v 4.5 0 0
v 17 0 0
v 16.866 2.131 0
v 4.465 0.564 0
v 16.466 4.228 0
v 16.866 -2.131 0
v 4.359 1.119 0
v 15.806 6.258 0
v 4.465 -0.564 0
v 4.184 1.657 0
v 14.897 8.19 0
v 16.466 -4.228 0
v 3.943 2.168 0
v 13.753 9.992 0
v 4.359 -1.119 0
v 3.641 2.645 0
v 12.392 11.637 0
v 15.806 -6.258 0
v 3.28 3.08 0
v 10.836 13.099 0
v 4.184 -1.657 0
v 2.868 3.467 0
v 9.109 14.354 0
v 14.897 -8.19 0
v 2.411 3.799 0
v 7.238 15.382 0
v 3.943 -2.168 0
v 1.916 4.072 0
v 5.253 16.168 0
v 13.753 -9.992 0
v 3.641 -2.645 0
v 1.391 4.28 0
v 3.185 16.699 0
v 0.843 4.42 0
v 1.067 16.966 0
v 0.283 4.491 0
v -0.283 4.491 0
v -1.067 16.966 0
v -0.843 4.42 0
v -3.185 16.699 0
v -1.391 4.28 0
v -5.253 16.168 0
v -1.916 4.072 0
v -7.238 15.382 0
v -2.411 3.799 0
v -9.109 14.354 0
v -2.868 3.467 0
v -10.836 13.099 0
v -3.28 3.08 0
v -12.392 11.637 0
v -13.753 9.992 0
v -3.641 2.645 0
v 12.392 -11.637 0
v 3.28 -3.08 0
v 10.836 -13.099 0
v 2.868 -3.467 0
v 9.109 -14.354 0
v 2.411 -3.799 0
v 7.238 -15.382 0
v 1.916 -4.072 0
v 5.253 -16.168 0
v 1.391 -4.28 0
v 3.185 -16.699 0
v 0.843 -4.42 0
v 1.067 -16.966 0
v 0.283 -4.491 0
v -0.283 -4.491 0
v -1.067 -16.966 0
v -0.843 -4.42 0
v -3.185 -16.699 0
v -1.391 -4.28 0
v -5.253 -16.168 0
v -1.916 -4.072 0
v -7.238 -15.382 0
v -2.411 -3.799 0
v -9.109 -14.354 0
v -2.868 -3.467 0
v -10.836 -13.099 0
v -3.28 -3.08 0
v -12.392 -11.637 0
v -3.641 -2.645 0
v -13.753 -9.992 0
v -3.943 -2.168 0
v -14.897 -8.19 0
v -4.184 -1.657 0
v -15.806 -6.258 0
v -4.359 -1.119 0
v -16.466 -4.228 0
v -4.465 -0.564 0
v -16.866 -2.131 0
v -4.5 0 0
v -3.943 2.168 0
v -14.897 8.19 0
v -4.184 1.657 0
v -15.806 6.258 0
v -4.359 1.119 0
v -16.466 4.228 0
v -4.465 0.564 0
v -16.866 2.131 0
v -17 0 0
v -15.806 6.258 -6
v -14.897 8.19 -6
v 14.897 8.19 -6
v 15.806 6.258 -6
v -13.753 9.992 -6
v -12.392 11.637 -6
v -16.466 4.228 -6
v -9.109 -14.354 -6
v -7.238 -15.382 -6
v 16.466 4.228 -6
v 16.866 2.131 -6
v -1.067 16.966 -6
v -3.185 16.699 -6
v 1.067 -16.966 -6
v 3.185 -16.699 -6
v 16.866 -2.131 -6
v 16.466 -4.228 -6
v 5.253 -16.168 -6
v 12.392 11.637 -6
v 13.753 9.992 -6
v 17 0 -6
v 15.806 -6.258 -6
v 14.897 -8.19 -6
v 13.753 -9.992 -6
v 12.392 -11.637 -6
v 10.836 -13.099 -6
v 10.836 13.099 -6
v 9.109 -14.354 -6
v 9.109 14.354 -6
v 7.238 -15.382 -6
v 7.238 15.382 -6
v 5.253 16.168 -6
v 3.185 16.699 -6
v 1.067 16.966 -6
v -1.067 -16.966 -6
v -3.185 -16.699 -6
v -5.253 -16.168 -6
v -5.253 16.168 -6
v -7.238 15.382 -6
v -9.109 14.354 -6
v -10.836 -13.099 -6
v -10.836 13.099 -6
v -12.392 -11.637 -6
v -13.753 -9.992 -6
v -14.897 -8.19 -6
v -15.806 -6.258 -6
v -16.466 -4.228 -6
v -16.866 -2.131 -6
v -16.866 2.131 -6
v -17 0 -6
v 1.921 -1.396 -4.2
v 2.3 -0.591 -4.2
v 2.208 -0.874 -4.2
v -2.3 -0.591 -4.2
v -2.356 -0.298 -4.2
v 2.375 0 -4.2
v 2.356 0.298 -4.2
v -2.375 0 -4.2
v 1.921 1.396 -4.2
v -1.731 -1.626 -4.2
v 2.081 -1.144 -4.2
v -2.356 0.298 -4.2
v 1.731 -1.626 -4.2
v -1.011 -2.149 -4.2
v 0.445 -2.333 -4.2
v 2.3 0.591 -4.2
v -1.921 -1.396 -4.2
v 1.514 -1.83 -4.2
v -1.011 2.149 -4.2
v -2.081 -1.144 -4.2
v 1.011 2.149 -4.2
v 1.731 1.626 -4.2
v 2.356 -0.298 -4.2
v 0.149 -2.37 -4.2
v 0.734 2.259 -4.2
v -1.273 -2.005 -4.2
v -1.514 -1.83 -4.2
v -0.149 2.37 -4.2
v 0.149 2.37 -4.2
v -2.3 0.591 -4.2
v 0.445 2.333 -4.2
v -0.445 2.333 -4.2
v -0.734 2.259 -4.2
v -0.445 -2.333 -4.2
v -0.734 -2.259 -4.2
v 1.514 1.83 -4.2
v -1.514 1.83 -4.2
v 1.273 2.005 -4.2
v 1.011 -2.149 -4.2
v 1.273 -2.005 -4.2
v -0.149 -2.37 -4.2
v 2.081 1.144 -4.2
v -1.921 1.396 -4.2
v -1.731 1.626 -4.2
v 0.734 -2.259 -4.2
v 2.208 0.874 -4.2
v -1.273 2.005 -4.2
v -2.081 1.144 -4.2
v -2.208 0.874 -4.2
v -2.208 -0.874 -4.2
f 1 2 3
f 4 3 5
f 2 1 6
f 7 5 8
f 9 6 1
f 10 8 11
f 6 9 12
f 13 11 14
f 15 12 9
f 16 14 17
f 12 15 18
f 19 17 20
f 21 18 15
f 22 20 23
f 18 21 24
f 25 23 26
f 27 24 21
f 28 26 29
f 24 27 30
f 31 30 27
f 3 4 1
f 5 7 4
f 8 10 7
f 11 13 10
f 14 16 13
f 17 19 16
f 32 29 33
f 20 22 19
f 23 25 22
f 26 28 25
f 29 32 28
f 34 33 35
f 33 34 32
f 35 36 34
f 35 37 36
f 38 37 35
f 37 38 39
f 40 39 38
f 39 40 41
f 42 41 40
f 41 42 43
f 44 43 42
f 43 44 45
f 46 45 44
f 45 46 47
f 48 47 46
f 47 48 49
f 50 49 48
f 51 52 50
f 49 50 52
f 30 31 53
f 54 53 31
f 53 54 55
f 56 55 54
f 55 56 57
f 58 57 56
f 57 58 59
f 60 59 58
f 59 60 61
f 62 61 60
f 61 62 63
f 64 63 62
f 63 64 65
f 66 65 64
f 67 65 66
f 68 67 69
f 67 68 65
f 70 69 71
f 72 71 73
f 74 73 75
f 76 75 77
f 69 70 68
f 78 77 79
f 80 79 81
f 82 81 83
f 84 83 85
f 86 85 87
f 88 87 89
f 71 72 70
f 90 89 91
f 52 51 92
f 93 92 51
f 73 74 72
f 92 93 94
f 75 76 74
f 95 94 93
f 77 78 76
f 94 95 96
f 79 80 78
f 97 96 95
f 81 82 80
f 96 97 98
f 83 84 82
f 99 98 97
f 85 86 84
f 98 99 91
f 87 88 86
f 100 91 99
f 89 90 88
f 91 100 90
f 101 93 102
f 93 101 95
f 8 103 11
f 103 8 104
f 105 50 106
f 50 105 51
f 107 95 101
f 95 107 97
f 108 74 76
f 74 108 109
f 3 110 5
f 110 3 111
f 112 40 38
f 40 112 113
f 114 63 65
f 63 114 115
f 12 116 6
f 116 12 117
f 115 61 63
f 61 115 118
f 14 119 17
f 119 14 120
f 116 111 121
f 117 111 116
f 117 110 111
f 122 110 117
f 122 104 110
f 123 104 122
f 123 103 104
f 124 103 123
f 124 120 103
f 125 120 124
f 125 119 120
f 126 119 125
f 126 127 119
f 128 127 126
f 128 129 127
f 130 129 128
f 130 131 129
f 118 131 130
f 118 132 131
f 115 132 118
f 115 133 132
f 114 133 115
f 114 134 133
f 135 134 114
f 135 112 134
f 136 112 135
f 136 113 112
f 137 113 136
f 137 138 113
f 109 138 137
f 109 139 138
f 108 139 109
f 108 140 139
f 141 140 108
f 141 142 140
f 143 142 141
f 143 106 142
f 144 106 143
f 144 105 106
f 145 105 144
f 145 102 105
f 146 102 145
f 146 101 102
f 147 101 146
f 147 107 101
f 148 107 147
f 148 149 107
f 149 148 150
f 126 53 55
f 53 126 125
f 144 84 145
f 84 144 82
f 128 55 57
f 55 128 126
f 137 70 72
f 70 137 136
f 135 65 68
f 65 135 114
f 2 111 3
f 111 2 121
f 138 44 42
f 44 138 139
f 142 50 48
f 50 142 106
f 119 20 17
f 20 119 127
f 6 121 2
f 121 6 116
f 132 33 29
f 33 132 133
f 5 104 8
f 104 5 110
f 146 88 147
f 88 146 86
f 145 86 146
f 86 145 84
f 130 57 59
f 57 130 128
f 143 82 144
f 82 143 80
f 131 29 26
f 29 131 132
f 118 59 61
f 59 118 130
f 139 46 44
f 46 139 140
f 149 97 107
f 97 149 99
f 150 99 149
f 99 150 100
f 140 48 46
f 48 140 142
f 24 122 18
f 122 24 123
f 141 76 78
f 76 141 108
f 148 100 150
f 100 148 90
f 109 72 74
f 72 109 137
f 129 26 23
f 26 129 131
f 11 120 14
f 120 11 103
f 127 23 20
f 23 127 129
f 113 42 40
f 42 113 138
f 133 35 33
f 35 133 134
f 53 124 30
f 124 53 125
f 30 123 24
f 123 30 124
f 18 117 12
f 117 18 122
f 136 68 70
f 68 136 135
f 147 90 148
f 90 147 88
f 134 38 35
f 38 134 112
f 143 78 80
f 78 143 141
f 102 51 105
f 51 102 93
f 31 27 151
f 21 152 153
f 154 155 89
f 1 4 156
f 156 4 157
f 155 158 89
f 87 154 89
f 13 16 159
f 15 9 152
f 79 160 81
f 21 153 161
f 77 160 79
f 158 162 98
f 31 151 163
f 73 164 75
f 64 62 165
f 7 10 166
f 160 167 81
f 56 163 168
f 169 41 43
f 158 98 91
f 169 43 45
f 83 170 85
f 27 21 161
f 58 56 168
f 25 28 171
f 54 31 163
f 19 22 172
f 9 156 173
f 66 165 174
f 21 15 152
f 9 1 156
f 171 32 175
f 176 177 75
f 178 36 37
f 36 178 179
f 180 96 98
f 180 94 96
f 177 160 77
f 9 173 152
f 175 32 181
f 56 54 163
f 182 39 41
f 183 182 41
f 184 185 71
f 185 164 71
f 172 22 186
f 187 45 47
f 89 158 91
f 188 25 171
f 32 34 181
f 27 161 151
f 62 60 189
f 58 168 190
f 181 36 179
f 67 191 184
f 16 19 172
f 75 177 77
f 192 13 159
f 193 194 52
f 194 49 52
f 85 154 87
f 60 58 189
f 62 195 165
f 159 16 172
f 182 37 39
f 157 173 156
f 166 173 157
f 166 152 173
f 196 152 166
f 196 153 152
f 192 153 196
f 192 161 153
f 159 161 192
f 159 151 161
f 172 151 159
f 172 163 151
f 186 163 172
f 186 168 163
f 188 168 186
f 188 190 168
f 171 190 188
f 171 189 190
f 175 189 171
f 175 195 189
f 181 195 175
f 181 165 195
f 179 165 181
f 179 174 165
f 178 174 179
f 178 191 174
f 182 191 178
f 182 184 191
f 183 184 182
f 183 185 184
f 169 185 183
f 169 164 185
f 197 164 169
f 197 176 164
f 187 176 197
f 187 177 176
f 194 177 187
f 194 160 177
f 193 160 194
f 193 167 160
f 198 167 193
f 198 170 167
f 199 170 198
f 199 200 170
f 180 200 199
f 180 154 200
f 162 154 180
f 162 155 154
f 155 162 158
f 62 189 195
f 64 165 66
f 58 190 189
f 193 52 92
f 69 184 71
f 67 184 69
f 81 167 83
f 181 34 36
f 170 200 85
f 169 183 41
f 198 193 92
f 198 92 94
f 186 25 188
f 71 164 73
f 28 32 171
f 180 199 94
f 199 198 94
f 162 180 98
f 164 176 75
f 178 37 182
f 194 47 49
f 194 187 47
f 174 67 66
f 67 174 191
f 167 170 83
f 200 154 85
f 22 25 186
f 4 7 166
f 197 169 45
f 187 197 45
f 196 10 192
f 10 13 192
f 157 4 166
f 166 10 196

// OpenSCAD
$fn = 50;


difference() {
	union() {
		translate(v = [0, 0, -3.0000000000]) {
			cylinder(h = 3, r = 7.0000000000);
		}
		translate(v = [0, 0, -6.0000000000]) {
			cylinder(h = 6, r = 17.0000000000);
		}
	}
	union() {
		translate(v = [0, 0, 0]) {
			rotate(a = [0, 0, 0]) {
				difference() {
					union() {
						#translate(v = [0, 0, -3.0000000000]) {
							cylinder(h = 3, r = 2.2500000000);
						}
						#translate(v = [0, 0, -4.2000000000]) {
							cylinder(h = 4.2000000000, r = 7.0000000000, r1 = 2.3750000000, r2 = 4.5000000000);
						}
						#translate(v = [0, 0, -3.0000000000]) {
							cylinder(h = 3, r = 2.3750000000);
						}
						#translate(v = [0, 0, -3.0000000000]) {
							cylinder(h = 3, r = 2.2500000000);
						}
					}
					union();
				}
			}
		}
	}
}
